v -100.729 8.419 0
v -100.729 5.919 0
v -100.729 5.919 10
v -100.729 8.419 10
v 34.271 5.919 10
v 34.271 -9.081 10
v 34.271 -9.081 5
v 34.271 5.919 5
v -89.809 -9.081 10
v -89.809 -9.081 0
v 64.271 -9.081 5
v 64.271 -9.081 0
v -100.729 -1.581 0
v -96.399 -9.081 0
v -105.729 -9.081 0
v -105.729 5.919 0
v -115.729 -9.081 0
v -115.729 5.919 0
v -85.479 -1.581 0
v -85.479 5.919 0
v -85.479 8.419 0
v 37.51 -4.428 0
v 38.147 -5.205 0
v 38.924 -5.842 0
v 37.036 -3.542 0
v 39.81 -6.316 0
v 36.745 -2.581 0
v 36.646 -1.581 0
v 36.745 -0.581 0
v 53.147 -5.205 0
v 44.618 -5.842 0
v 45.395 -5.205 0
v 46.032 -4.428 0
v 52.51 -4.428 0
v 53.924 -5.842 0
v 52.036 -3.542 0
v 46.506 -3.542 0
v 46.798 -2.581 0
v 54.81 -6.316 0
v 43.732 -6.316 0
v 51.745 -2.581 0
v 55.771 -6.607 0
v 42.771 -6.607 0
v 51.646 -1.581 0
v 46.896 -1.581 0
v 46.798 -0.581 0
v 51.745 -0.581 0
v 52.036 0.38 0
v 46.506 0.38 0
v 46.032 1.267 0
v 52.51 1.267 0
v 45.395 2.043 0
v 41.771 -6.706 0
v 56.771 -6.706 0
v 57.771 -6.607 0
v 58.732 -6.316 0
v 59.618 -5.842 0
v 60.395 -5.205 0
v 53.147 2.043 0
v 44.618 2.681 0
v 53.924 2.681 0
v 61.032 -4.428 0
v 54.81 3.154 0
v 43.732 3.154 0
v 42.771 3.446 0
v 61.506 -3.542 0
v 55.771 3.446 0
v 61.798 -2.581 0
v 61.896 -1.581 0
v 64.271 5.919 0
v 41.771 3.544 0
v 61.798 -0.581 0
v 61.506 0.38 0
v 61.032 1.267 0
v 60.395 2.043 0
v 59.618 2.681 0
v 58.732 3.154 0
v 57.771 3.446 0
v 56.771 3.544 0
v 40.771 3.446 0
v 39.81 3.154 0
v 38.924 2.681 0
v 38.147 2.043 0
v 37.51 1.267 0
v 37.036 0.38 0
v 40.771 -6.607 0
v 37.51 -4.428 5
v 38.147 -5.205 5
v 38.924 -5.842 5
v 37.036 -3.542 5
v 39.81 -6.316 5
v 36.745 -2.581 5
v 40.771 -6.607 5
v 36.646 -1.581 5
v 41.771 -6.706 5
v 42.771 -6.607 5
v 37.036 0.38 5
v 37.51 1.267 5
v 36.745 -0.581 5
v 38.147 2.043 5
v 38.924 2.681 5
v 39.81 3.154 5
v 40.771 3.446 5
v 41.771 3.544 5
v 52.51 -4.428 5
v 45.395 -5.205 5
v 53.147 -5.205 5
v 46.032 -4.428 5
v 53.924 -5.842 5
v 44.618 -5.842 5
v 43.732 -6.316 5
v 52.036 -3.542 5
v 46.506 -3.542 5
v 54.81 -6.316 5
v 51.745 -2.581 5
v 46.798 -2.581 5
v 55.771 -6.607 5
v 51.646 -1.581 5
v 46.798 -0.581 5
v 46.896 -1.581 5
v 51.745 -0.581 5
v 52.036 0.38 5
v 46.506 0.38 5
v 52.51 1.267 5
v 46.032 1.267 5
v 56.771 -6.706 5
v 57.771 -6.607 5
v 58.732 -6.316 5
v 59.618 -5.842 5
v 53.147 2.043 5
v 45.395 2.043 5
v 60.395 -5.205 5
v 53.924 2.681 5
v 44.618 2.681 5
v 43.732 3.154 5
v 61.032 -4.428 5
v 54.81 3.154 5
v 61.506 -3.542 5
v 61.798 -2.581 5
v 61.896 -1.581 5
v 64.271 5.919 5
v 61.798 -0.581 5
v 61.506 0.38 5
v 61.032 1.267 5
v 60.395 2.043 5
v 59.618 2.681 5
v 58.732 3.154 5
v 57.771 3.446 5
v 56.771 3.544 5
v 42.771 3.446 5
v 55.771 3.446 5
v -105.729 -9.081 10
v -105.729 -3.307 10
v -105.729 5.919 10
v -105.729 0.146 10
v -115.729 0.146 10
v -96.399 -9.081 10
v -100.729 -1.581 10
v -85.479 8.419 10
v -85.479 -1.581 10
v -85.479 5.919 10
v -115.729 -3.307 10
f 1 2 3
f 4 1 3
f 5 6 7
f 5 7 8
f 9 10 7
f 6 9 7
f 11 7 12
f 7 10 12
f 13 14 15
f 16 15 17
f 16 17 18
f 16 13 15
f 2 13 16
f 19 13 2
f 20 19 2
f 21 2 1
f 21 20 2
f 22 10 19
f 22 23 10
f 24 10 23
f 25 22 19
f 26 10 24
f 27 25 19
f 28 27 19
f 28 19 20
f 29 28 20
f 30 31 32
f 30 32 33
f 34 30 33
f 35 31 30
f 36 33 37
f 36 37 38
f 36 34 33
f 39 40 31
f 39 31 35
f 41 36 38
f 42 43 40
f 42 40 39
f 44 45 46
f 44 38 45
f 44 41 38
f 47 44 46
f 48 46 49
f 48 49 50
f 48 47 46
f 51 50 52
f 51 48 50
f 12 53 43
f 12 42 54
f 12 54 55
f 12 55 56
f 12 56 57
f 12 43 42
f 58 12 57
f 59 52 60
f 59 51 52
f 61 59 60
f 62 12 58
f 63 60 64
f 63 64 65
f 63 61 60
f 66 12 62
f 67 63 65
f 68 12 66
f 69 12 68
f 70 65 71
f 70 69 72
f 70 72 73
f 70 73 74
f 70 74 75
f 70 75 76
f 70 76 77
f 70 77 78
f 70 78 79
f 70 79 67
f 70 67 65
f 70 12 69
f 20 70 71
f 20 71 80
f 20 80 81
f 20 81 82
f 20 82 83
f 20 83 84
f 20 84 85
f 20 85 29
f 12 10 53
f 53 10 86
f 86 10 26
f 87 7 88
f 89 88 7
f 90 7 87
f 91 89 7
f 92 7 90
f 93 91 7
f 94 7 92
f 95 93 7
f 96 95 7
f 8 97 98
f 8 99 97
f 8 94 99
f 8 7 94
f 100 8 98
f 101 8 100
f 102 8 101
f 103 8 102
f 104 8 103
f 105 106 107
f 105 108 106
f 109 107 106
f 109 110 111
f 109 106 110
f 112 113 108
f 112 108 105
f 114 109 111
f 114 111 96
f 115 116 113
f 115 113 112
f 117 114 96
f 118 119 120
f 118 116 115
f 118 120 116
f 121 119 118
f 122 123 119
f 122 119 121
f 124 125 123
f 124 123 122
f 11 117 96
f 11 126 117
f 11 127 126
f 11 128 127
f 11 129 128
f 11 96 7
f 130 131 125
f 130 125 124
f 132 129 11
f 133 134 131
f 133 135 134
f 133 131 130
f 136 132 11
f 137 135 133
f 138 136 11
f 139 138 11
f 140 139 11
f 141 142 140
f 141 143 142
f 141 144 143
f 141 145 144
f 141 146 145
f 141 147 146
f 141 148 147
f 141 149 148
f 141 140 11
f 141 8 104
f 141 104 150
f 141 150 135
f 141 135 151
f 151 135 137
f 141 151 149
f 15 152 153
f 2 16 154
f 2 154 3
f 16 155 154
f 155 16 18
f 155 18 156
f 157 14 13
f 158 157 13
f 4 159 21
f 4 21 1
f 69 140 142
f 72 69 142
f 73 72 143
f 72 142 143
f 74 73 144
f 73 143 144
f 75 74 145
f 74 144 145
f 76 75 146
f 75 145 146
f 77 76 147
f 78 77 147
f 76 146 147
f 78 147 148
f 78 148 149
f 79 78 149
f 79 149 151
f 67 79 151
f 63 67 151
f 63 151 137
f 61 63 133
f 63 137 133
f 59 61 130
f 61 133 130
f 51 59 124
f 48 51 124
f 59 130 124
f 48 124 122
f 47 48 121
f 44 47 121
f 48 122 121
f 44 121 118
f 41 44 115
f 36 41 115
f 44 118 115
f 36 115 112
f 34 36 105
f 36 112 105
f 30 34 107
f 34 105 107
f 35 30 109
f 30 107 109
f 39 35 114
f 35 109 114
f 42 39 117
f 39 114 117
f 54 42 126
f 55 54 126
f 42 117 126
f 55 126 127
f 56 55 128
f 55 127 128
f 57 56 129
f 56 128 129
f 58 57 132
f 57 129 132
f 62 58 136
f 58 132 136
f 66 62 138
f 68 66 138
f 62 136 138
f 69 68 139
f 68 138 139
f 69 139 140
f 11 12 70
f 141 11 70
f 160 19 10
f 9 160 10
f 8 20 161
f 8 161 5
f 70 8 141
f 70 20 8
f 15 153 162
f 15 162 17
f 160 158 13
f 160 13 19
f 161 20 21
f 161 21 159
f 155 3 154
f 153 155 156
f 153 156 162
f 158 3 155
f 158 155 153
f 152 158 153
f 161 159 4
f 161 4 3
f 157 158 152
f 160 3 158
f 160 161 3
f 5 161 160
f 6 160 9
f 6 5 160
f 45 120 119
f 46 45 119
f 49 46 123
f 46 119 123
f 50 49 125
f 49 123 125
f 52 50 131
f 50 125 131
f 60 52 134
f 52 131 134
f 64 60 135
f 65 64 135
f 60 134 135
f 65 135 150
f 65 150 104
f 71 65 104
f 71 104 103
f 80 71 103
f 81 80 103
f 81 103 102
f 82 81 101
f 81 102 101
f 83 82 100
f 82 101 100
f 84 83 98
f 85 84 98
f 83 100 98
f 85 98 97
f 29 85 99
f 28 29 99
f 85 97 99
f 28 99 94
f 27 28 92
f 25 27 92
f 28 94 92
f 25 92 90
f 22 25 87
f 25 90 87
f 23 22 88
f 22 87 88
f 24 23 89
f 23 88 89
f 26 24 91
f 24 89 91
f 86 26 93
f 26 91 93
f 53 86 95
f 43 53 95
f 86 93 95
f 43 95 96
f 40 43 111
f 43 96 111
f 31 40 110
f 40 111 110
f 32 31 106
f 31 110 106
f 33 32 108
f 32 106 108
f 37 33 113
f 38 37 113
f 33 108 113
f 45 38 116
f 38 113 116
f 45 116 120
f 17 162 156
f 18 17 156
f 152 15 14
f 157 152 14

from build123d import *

# Parameters (mm, degrees)
SKETCH_W        = 170
SKETCH_H        = 15
PAD_DEPTH       = 10
SKETCH001_W     = 35
SKETCH001_H     = 25
POCKET_DEPTH    = 5
PAD002_DEPTH    = 10
POCKET001_DEPTH = 10
SKETCH002_R     = 5.125
POCKET002_DEPTH = 5
SKETCH005_W     = 15.25
SKETCH005_H     = 10
PAD003_DEPTH    = 2.5


with BuildPart() as part:
    # Sketch → Pad (new body)
    with BuildSketch(Plane.XY):
        with Locations((-20.728933, -1.58076)):
            Rectangle(SKETCH_W, SKETCH_H)
    extrude(amount=PAD_DEPTH)

    # Sketch001 (on Face6 of Pad) → Pocket (cut)
    with BuildSketch(Plane.XY.offset(10)):
        with Locations((51.771067, -1.58076)):
            Rectangle(SKETCH001_W, SKETCH001_H)
    extrude(amount=-POCKET_DEPTH, mode=Mode.SUBTRACT)

    # Sketch003 → Pad002 (join)
    with BuildSketch(Plane(origin=(-105.728933, 0, 0), x_dir=(0, -1, 0), z_dir=(-1, 0, 0))):
        Polygon((-5.91924, 0), (-0.145737, 10), (3.307257, 10), (9.08076, 0), align=None)
    extrude(amount=PAD002_DEPTH)

    # Sketch004 (on Face3 of Pad002) → Pocket001 (cut)
    with BuildSketch(Plane.XY.offset(10)):
        Polygon((-93.103933, -14.787648), (-100.728933, -1.58076), (-85.478933, -1.58076), align=None)
    extrude(amount=-POCKET001_DEPTH, mode=Mode.SUBTRACT)

    # Sketch002 (on Face7 of Pocket) → Pocket002 (cut)
    with BuildSketch(Plane.XY.offset(5)):
        with Locations((56.771067, -1.58076)):
            Circle(SKETCH002_R)
        with Locations((41.771067, -1.58076)):
            Circle(SKETCH002_R)
    extrude(amount=-POCKET002_DEPTH, mode=Mode.SUBTRACT)

    # Sketch005 (on Face9 of Pocket002) → Pad003 (join)
    with BuildSketch(Plane(origin=(0, 5.91924, 0), x_dir=(-1, 0, 0), z_dir=(0, 1, 0))):
        with Locations((93.103933, 5)):
            Rectangle(SKETCH005_W, SKETCH005_H)
    extrude(amount=PAD003_DEPTH)


solid = part.part
